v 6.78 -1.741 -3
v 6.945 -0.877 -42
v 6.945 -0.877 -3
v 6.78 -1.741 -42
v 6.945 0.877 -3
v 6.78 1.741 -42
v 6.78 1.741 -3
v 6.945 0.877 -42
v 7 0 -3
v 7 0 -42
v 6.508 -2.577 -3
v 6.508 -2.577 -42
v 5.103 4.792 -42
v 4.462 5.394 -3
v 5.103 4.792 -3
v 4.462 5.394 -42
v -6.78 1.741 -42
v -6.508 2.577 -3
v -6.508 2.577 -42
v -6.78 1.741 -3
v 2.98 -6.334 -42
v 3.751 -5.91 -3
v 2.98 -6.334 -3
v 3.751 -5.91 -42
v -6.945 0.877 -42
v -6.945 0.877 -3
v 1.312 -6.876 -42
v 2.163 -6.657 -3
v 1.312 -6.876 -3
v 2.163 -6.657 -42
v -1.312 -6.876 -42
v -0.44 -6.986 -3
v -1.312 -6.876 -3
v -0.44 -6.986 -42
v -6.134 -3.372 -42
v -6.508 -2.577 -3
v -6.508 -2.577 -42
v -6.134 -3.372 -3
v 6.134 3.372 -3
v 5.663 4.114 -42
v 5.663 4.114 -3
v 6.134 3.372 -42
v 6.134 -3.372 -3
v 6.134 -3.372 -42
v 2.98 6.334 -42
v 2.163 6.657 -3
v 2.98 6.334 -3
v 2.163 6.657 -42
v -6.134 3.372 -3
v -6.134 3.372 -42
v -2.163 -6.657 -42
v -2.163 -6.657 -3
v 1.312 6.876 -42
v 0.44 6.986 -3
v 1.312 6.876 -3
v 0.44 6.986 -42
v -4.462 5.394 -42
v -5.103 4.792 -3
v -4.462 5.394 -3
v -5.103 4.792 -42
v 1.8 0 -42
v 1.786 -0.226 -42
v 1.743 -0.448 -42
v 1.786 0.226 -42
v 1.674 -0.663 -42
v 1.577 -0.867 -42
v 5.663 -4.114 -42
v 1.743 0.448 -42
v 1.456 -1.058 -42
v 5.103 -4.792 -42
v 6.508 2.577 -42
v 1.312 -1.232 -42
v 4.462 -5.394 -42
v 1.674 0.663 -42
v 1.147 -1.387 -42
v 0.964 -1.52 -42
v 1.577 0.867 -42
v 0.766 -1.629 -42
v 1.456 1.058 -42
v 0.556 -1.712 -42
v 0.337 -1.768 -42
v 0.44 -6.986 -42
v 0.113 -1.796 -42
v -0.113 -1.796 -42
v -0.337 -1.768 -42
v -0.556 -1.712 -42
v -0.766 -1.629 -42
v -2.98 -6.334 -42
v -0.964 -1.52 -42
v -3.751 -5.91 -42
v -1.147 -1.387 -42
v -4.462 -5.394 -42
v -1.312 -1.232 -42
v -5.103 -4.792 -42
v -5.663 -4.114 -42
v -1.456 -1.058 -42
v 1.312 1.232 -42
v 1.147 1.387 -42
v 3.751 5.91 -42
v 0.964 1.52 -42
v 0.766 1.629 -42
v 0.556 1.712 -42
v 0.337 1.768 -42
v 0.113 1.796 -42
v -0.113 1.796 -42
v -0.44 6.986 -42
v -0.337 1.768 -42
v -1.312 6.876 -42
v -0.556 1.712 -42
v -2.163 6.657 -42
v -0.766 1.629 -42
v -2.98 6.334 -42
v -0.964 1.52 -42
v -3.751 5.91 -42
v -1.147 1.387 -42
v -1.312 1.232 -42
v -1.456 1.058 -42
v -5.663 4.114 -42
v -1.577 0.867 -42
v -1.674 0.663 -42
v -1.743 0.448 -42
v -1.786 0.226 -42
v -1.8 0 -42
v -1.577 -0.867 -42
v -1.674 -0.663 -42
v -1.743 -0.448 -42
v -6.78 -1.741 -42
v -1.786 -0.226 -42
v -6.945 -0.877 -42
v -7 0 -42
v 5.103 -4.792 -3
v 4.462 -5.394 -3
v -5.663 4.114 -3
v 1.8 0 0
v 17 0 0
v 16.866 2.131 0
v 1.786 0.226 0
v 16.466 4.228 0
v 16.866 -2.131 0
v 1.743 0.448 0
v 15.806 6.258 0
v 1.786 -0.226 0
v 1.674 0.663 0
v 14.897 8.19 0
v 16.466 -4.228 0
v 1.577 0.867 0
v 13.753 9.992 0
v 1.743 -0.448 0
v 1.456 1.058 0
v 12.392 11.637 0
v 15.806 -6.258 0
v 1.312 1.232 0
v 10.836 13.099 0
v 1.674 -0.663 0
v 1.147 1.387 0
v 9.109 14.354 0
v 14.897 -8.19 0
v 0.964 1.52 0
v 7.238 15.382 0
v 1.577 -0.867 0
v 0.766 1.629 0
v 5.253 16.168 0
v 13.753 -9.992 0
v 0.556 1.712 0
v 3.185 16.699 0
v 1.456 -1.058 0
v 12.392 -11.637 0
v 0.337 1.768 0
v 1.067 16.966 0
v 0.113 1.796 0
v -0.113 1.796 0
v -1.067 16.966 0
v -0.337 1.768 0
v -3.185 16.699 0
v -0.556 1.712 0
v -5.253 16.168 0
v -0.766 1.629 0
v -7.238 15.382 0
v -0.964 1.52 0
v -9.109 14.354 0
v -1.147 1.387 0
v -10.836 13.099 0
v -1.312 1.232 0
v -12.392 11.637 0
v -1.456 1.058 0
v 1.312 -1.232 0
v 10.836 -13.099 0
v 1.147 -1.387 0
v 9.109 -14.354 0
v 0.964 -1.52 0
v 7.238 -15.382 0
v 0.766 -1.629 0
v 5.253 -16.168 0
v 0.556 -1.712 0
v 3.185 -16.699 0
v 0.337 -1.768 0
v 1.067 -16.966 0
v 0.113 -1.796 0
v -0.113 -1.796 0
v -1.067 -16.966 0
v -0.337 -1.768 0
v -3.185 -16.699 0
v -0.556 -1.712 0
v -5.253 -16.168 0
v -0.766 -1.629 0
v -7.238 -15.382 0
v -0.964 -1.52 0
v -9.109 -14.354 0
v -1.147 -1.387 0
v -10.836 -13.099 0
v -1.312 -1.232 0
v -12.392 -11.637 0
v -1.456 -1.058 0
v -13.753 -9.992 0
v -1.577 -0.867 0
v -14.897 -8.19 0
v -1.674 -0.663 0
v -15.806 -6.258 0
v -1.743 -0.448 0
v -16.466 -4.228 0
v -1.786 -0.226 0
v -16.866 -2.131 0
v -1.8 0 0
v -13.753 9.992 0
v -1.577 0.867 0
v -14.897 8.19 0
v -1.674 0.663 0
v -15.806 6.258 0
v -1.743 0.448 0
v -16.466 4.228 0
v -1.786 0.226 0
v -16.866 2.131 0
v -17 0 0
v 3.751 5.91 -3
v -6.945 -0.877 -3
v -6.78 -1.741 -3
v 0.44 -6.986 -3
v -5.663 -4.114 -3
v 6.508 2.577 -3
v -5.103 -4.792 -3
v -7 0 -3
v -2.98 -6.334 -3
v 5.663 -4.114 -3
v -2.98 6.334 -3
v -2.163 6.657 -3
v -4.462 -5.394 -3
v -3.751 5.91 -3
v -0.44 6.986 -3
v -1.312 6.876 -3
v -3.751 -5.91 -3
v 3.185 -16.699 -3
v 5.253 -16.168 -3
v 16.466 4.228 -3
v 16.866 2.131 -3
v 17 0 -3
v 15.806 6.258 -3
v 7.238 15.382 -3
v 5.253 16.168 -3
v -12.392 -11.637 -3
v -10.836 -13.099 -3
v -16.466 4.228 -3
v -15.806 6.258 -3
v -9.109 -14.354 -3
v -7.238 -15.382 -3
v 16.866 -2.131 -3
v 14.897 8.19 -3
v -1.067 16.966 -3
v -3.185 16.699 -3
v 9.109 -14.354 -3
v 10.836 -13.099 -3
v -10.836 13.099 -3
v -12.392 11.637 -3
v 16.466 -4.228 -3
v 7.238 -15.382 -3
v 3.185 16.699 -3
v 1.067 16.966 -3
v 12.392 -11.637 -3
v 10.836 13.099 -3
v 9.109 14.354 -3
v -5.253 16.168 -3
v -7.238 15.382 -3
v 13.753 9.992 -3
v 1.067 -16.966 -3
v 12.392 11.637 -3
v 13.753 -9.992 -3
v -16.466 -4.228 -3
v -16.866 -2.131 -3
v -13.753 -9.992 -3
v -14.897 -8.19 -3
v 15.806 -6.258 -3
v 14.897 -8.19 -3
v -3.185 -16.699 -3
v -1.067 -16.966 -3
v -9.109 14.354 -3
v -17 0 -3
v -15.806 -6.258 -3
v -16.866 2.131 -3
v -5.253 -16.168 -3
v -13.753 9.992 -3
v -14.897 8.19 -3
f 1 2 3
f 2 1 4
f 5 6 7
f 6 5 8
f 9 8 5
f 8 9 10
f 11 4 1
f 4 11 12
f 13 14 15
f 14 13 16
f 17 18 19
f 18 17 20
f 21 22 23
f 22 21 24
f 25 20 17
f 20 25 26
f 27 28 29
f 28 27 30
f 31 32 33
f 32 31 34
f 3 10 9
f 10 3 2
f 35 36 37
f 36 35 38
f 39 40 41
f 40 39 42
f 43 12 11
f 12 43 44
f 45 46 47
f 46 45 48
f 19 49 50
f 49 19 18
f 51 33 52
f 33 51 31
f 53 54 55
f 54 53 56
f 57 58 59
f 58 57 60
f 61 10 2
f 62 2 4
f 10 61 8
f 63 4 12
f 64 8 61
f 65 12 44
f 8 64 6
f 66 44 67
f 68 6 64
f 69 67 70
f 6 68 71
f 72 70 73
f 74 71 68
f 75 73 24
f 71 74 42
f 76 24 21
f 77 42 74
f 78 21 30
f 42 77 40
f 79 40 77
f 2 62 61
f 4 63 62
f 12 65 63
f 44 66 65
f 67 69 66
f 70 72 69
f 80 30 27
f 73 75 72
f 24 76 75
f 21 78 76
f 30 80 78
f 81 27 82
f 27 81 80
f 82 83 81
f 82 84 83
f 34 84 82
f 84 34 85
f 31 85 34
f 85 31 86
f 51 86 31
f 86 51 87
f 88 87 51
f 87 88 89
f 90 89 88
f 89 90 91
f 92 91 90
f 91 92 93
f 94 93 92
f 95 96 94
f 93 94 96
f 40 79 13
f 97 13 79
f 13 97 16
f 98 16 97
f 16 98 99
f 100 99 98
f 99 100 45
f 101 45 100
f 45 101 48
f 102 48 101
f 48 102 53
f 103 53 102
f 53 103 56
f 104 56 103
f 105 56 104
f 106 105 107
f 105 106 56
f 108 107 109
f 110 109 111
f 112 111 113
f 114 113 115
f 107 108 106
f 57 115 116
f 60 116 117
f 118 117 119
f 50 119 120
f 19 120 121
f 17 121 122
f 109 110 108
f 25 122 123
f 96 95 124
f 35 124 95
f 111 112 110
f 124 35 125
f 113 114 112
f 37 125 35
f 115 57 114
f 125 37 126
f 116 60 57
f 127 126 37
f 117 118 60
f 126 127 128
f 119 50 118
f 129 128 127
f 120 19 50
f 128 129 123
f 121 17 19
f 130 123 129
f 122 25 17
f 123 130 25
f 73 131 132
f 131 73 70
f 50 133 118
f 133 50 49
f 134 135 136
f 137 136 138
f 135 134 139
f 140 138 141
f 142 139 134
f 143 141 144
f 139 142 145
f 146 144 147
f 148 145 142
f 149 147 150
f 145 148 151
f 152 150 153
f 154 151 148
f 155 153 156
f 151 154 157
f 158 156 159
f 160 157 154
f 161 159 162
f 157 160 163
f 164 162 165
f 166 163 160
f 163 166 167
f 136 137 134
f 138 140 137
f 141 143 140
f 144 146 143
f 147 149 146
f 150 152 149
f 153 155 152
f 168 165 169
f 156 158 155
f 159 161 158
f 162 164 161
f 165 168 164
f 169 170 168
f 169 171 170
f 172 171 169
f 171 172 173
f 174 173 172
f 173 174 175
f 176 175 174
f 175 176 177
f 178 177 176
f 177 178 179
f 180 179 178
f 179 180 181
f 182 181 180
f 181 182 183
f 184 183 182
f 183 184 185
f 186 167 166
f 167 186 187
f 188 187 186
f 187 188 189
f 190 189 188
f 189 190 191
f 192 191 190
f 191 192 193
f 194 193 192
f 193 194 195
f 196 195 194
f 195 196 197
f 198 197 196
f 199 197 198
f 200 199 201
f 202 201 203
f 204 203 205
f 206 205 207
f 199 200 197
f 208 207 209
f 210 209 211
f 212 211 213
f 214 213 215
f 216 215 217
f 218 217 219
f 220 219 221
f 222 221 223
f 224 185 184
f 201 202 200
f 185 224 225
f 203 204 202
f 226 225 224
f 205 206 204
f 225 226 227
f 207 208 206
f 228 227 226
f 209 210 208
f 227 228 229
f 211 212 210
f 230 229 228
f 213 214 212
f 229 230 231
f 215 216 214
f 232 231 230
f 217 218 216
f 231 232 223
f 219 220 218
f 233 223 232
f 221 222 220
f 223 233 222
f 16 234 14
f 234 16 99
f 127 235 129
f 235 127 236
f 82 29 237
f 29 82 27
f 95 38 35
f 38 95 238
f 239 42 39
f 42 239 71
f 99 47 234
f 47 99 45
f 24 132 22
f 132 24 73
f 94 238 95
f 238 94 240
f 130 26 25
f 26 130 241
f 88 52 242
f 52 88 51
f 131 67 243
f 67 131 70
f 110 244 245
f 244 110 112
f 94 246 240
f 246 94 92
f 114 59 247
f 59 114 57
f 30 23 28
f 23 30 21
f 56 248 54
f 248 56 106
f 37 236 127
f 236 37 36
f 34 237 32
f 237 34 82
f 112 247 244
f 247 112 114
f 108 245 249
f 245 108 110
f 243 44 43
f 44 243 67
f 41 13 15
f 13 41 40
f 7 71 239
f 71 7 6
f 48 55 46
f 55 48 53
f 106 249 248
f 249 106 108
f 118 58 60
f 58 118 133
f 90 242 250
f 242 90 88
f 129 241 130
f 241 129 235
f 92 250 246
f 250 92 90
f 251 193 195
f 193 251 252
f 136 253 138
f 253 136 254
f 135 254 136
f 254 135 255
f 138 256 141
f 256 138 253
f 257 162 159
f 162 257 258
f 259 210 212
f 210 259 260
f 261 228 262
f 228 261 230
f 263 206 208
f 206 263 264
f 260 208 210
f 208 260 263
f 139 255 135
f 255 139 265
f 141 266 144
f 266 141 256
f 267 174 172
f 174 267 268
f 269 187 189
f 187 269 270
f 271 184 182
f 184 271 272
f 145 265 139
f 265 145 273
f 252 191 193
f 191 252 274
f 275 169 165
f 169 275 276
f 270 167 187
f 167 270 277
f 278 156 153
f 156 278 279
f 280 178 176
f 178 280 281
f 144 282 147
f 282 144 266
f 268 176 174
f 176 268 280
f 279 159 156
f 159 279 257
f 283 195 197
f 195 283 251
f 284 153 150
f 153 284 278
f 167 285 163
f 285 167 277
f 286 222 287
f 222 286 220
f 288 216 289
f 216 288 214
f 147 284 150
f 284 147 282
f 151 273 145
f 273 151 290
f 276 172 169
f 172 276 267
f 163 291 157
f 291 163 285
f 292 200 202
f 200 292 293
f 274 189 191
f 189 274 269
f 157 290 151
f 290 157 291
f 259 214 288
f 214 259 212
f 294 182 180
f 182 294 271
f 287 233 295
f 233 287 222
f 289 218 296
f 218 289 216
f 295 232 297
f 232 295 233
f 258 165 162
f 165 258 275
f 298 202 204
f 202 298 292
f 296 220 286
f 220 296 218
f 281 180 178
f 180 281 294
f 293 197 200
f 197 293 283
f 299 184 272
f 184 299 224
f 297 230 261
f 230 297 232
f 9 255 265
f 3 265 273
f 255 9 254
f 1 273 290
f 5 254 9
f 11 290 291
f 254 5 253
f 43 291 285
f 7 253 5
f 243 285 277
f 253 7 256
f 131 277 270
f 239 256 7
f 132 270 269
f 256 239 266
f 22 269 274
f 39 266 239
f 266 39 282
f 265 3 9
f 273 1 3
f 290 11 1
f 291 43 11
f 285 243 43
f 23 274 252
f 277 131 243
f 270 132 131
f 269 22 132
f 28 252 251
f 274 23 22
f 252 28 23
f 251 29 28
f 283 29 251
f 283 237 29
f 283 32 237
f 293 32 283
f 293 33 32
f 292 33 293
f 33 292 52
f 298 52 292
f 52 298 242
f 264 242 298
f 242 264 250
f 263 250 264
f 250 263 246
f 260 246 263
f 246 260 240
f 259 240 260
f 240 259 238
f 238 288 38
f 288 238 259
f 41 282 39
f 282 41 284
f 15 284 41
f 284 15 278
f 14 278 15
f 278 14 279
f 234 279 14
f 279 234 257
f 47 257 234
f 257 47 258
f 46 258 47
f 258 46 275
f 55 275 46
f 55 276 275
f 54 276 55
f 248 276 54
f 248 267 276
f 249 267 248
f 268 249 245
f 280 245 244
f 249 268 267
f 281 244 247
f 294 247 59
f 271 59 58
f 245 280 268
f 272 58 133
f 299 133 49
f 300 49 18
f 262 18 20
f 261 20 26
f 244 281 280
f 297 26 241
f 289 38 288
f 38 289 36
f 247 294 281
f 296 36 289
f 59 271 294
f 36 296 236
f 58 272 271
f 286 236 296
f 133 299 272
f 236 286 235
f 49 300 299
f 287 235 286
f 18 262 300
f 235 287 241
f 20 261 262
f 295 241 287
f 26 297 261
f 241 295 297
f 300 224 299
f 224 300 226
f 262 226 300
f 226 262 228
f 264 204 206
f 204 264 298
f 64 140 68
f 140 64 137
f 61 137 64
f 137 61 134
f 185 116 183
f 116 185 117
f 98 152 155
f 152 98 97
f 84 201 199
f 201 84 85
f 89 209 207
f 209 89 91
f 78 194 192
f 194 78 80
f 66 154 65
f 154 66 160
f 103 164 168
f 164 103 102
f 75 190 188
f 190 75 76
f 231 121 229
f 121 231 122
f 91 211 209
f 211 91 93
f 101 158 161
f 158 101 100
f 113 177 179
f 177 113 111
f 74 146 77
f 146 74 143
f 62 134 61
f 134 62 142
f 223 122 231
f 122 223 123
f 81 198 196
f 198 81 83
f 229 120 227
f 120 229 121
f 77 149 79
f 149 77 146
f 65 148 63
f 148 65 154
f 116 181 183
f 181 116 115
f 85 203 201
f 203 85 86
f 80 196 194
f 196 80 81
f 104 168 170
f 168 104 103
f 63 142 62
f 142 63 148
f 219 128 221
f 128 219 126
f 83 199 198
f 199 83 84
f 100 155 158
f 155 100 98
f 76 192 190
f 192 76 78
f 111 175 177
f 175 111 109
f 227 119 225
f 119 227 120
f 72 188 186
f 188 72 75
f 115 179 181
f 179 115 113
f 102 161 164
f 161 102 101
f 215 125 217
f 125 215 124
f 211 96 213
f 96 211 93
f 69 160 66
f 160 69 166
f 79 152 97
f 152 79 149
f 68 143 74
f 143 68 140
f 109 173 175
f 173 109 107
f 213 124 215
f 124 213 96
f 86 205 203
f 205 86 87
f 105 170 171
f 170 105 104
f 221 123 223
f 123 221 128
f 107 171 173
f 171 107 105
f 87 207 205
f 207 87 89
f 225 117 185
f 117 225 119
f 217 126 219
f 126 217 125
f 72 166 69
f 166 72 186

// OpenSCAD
$fn = 50;


difference() {
	union() {
		translate(v = [0, 0, -42.0000000000]) {
			cylinder(h = 42, r = 7.0000000000);
		}
		translate(v = [0, 0, -3.0000000000]) {
			cylinder(h = 3, r = 17.0000000000);
		}
	}
	union() {
		#translate(v = [0, 0, -42]) {
			cylinder(h = 42, r = 1.8000000000);
		}
	}
}
